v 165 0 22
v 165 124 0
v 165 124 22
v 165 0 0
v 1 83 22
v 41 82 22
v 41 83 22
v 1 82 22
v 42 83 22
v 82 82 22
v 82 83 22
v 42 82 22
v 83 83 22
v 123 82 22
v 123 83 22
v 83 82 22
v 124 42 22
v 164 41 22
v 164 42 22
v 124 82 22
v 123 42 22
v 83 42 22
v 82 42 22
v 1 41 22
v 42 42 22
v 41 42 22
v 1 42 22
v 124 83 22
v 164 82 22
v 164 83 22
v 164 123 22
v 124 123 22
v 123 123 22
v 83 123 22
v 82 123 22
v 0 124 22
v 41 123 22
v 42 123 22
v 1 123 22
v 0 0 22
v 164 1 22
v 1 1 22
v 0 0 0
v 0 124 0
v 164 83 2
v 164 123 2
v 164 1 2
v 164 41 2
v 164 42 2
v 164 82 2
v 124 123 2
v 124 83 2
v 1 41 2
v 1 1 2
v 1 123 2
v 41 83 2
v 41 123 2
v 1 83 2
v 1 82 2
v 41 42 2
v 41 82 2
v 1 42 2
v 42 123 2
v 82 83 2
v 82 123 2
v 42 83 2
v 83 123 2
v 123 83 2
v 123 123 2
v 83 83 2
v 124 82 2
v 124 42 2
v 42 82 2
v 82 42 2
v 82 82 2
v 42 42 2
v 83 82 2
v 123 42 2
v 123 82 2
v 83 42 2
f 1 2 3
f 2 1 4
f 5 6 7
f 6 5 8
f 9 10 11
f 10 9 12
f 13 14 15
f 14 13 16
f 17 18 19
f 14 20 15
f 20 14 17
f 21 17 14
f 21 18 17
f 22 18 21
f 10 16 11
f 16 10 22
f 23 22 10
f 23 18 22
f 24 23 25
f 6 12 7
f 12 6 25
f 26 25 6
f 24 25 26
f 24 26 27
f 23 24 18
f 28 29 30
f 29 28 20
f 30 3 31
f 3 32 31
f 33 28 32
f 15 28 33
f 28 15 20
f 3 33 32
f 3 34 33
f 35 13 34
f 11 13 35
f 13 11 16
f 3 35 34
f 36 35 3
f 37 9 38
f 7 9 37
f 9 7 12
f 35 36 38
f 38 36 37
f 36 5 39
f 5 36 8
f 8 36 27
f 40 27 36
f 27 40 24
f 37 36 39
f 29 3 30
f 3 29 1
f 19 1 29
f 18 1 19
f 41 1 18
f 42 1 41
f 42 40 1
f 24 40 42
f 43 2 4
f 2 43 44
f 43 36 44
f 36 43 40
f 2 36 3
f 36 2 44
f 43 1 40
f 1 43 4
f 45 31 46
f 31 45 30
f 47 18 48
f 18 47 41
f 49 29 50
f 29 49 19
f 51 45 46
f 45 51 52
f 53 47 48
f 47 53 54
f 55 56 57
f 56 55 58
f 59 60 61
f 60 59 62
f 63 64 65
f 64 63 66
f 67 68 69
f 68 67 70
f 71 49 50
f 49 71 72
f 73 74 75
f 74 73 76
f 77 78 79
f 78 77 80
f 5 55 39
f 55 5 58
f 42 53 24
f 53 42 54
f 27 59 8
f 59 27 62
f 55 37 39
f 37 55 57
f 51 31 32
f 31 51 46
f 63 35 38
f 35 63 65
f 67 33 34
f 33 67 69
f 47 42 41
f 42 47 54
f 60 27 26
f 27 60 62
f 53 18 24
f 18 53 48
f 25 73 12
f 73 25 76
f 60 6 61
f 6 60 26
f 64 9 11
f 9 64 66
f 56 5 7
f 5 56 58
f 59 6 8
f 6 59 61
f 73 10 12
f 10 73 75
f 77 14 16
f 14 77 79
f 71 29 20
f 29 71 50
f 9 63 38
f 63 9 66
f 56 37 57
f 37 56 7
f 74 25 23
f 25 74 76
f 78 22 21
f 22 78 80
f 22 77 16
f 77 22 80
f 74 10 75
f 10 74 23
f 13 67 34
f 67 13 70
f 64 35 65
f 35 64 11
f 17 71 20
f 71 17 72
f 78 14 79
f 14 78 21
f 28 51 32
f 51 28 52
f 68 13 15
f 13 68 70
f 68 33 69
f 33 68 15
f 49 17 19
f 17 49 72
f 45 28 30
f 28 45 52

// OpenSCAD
// h/w/d are exclusive of walls
thickness_bottom=2;
thickness_outer_wall=1;
thickness_inner_wall=1;
cell_height=20;
cell_width=40;
cell_depth=40;
cell_layout = [
    [1,2,3,4]
    , [5,6,7,8]
    , [9,9,9,9]
];

build_container(thickness_bottom,thickness_outer_wall,thickness_inner_wall,cell_height,cell_width,cell_depth,cell_layout);

function reverse (a, i=0) =
    len(a) > i ?
        concat(reverse(a, i+1), [a[i]]) :
        []
;

module build_container(tb,tow,tiw,h,w,d,c) {
    cells = reverse(c);
    cnt_cx = len(cells[0]);
    cnt_cy = len(cells);
    total_x = cnt_cx*w+2*tow+(cnt_cx-1)*tiw;
    total_y = cnt_cy*d+2*tow+(cnt_cy-1)*tiw;
    total_z = tb+h;

    echo("Box totals:", total_x, total_y, total_z);

    difference() {
        cube([total_x,total_y,total_z]);
        translate([tow,tow,tb]) cube([total_x-2*tow,total_y-2*tow,total_z-tb]);
    }
    for (x=[0:cnt_cx-1],y=[0:cnt_cy-1]) {
        x_right = x+1;
        y_top = y+1;
        if (x_right < cnt_cx && cells[y][x] != cells[y][x_right]) {
            offset_y = tow+y*(d+tiw)-tiw;
            translate([tow+w*x_right+tiw*x,offset_y,0])
                cube([tiw,d+tiw*2,h+tb]);
        }
        if (y_top < cnt_cy && cells[y][x] != cells[y_top][x]) {
            offset_x = tow+x*(w+tiw)-tiw;
            translate([offset_x,tow+d*y_top+tiw*y,0])
                cube([w+tiw*2,tiw,h+tb]);
        }
    }
}
